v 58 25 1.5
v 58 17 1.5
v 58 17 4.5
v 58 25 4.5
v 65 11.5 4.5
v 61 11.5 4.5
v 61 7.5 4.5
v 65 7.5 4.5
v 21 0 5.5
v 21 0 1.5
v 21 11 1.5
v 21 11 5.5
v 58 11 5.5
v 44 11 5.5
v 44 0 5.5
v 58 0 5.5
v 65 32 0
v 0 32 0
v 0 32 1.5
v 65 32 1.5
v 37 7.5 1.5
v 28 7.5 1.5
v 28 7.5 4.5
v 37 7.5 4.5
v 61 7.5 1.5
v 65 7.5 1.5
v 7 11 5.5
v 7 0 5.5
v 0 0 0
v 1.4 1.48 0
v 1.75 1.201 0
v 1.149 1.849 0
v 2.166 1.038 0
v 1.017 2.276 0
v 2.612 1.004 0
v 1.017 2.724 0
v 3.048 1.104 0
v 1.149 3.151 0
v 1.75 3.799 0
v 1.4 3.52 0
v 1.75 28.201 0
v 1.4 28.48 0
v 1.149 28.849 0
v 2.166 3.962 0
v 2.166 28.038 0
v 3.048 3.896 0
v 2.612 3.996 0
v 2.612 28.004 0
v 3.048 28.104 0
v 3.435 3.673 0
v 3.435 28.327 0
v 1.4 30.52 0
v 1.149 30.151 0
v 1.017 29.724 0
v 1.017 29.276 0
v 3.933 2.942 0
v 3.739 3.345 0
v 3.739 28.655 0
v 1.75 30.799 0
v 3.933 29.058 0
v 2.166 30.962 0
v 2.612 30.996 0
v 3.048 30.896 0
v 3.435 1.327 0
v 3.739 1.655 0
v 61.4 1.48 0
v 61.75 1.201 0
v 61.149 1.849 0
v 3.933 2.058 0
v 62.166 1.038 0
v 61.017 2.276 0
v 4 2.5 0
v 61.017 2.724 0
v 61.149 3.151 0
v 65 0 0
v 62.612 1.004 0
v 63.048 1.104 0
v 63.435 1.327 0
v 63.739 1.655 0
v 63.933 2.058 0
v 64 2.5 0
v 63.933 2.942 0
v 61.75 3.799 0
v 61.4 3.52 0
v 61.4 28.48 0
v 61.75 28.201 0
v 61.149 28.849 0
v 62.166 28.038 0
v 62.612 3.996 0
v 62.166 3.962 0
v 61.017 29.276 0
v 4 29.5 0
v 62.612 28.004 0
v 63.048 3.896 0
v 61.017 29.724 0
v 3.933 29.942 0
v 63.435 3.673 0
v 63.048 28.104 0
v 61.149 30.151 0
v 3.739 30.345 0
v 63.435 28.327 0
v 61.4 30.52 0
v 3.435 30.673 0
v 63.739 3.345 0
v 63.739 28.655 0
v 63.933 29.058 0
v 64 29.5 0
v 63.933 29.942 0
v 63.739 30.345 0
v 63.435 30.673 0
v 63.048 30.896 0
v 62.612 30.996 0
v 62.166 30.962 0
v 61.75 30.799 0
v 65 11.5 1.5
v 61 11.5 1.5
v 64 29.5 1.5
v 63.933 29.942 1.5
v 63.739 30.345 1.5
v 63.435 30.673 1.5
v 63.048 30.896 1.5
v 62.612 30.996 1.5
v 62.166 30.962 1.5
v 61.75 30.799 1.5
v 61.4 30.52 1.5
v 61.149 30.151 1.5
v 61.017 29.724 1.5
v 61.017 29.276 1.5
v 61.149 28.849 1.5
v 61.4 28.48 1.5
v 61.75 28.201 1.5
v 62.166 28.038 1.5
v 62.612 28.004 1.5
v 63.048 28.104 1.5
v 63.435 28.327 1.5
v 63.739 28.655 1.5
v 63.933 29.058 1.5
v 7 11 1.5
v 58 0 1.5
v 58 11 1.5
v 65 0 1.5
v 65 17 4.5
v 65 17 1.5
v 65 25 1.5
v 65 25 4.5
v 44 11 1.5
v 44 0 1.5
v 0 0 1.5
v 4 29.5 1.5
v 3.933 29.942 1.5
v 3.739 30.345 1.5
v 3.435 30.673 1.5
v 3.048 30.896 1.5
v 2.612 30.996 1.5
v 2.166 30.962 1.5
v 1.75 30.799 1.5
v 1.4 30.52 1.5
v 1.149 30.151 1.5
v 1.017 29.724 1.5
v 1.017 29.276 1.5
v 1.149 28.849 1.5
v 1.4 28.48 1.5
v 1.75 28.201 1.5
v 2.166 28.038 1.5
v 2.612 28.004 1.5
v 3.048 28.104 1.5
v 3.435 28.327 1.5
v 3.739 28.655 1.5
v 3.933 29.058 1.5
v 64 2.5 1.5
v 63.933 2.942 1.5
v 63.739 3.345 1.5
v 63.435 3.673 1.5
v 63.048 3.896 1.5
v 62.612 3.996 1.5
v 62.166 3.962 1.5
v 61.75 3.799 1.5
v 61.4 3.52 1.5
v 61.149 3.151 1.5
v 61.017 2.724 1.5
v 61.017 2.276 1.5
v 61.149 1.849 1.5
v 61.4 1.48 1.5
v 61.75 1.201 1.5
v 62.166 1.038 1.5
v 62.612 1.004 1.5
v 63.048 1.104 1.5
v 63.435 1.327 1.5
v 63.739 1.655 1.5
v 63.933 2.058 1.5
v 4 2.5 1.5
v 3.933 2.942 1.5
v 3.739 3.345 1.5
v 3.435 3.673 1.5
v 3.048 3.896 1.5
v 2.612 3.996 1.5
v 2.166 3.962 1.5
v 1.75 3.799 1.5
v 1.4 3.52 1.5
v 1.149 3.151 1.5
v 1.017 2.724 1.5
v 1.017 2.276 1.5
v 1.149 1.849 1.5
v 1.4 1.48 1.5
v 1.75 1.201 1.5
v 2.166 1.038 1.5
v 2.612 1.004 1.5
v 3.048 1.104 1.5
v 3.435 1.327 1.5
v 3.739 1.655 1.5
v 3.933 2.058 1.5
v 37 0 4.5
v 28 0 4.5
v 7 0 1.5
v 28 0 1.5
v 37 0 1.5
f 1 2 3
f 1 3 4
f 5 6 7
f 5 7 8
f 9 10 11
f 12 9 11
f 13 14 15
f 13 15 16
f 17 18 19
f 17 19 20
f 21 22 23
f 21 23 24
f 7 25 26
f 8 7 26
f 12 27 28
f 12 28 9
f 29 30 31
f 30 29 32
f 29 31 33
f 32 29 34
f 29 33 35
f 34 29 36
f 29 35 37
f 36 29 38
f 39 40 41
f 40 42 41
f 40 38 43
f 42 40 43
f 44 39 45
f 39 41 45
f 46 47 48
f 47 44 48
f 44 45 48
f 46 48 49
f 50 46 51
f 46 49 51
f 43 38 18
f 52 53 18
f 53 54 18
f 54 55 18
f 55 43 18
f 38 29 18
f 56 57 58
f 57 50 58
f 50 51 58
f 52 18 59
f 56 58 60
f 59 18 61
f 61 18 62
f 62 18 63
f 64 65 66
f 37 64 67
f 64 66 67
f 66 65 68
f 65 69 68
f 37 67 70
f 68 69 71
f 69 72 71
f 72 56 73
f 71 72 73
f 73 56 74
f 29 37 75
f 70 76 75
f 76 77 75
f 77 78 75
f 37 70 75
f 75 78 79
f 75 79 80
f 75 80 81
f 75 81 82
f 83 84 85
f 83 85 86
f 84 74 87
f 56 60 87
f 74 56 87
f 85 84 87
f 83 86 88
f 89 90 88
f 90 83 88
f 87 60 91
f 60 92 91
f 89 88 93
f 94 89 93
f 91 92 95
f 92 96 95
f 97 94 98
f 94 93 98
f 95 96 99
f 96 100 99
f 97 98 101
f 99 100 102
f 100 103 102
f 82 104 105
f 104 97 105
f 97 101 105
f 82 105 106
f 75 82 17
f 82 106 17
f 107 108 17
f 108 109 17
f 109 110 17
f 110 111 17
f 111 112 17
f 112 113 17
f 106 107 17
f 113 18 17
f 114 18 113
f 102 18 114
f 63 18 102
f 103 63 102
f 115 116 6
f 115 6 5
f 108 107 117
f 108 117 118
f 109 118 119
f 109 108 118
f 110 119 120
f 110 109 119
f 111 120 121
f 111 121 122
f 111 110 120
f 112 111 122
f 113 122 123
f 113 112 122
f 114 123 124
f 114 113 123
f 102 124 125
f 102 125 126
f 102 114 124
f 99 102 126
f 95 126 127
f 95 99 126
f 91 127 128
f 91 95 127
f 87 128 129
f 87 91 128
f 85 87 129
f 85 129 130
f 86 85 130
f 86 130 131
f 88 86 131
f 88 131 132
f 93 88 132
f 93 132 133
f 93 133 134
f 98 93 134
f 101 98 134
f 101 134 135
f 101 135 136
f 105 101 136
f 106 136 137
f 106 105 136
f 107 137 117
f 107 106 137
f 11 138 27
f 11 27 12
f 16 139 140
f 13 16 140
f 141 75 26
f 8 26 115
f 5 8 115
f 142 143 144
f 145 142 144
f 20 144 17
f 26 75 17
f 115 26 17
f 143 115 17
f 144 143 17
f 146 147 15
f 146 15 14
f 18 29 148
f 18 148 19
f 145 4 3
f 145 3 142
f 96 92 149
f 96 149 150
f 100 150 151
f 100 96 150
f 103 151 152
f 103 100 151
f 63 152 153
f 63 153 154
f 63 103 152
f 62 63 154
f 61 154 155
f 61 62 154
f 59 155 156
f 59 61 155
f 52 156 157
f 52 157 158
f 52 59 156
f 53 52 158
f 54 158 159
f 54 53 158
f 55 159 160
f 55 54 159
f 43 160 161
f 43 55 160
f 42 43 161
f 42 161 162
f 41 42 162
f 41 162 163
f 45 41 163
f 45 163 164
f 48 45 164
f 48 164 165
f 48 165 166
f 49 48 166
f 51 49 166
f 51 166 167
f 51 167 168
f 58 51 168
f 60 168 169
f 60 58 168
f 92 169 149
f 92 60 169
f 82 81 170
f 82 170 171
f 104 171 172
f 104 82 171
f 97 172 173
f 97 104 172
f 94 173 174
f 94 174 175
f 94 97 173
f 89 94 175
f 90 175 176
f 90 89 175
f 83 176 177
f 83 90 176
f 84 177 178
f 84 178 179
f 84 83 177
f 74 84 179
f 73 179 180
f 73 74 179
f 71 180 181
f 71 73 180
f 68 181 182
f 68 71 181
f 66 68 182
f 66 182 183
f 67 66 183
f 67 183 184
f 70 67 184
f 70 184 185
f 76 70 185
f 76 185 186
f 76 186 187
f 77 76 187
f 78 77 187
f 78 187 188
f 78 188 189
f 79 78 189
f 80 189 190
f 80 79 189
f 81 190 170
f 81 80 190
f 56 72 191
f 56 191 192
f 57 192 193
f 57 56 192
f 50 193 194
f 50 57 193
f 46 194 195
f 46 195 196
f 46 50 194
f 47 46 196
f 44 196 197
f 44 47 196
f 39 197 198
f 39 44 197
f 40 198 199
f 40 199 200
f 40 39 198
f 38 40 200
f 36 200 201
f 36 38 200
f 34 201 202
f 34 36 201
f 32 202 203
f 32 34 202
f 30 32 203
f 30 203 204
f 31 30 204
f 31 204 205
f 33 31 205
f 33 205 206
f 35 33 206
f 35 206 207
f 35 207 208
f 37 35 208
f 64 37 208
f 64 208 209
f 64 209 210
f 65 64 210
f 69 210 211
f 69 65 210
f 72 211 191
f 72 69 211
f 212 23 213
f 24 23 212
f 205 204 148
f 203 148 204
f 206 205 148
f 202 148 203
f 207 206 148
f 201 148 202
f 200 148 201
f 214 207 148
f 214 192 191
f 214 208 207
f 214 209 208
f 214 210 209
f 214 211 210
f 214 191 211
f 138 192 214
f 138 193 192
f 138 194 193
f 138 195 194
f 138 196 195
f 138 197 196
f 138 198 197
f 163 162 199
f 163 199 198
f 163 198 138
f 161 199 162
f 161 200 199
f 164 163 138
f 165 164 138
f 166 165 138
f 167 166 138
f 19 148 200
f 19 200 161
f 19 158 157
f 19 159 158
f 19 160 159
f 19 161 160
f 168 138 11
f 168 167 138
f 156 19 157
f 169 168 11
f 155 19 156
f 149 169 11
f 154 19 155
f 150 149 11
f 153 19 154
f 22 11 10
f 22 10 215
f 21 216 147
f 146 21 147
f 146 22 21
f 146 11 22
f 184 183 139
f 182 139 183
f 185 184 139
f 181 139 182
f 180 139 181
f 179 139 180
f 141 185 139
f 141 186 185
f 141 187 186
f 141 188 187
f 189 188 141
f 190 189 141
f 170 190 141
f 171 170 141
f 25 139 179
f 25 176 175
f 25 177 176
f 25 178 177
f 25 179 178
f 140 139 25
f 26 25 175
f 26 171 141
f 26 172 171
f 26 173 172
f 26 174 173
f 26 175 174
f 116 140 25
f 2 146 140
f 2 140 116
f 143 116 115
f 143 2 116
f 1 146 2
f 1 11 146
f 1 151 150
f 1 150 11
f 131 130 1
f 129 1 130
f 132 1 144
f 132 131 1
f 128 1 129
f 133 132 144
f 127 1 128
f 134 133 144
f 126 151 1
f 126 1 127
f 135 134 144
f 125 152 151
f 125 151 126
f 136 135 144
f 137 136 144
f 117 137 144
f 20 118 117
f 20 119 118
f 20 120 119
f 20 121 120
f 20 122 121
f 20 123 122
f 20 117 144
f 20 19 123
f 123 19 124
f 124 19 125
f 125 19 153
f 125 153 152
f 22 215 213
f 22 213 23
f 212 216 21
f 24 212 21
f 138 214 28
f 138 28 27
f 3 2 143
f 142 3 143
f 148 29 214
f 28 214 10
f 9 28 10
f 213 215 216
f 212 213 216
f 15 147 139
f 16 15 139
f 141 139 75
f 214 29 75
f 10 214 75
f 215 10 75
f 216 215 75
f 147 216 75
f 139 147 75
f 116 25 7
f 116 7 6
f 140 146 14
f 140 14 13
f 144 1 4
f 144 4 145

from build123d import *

# Parameters (mm, degrees)
SKETCH1_W           = 65
SKETCH1_H           = 32
SKETCH1_R           = 1.5
BOSS_EXTRUDE1_DEPTH = 1.5
SKETCH2_W           = 14
SKETCH2_H           = 11
BOSS_EXTRUDE2_DEPTH = 4
SKETCH3_W           = 7
SKETCH3_H           = 8
SKETCH3_W_2         = 4
SKETCH3_H_2         = 4
SKETCH3_W_3         = 9
SKETCH3_H_3         = 7.5
BOSS_EXTRUDE3_DEPTH = 3


with BuildPart() as part:
    # Sketch1 → Boss-Extrude1 (new body)
    with BuildSketch(Plane.XY):
        with Locations((32.5, 16)):
            Rectangle(SKETCH1_W, SKETCH1_H)
        with Locations((2.5, 2.5)):
            Circle(SKETCH1_R, mode=Mode.SUBTRACT)
        with Locations((2.5, 29.5)):
            Circle(SKETCH1_R, mode=Mode.SUBTRACT)
        with Locations((62.5, 29.5)):
            Circle(SKETCH1_R, mode=Mode.SUBTRACT)
        with Locations((62.5, 2.5)):
            Circle(SKETCH1_R, mode=Mode.SUBTRACT)
    extrude(amount=BOSS_EXTRUDE1_DEPTH)

    # Sketch2 → Boss-Extrude2 (add)
    with BuildSketch(Plane.XY.offset(1.5)):
        with Locations((14, 5.5)):
            Rectangle(SKETCH2_W, SKETCH2_H)
        with Locations((51, 5.5)):
            Rectangle(SKETCH2_W, SKETCH2_H)
    extrude(amount=BOSS_EXTRUDE2_DEPTH)

    # Sketch3 → Boss-Extrude3 (add)
    with BuildSketch(Plane.XY.offset(1.5)):
        with Locations((61.5, 21)):
            Rectangle(SKETCH3_W, SKETCH3_H)
        with Locations((63, 9.5)):
            Rectangle(SKETCH3_W_2, SKETCH3_H_2)
        with Locations((32.5, 3.75)):
            Rectangle(SKETCH3_W_3, SKETCH3_H_3)
    extrude(amount=BOSS_EXTRUDE3_DEPTH)


solid = part.part
